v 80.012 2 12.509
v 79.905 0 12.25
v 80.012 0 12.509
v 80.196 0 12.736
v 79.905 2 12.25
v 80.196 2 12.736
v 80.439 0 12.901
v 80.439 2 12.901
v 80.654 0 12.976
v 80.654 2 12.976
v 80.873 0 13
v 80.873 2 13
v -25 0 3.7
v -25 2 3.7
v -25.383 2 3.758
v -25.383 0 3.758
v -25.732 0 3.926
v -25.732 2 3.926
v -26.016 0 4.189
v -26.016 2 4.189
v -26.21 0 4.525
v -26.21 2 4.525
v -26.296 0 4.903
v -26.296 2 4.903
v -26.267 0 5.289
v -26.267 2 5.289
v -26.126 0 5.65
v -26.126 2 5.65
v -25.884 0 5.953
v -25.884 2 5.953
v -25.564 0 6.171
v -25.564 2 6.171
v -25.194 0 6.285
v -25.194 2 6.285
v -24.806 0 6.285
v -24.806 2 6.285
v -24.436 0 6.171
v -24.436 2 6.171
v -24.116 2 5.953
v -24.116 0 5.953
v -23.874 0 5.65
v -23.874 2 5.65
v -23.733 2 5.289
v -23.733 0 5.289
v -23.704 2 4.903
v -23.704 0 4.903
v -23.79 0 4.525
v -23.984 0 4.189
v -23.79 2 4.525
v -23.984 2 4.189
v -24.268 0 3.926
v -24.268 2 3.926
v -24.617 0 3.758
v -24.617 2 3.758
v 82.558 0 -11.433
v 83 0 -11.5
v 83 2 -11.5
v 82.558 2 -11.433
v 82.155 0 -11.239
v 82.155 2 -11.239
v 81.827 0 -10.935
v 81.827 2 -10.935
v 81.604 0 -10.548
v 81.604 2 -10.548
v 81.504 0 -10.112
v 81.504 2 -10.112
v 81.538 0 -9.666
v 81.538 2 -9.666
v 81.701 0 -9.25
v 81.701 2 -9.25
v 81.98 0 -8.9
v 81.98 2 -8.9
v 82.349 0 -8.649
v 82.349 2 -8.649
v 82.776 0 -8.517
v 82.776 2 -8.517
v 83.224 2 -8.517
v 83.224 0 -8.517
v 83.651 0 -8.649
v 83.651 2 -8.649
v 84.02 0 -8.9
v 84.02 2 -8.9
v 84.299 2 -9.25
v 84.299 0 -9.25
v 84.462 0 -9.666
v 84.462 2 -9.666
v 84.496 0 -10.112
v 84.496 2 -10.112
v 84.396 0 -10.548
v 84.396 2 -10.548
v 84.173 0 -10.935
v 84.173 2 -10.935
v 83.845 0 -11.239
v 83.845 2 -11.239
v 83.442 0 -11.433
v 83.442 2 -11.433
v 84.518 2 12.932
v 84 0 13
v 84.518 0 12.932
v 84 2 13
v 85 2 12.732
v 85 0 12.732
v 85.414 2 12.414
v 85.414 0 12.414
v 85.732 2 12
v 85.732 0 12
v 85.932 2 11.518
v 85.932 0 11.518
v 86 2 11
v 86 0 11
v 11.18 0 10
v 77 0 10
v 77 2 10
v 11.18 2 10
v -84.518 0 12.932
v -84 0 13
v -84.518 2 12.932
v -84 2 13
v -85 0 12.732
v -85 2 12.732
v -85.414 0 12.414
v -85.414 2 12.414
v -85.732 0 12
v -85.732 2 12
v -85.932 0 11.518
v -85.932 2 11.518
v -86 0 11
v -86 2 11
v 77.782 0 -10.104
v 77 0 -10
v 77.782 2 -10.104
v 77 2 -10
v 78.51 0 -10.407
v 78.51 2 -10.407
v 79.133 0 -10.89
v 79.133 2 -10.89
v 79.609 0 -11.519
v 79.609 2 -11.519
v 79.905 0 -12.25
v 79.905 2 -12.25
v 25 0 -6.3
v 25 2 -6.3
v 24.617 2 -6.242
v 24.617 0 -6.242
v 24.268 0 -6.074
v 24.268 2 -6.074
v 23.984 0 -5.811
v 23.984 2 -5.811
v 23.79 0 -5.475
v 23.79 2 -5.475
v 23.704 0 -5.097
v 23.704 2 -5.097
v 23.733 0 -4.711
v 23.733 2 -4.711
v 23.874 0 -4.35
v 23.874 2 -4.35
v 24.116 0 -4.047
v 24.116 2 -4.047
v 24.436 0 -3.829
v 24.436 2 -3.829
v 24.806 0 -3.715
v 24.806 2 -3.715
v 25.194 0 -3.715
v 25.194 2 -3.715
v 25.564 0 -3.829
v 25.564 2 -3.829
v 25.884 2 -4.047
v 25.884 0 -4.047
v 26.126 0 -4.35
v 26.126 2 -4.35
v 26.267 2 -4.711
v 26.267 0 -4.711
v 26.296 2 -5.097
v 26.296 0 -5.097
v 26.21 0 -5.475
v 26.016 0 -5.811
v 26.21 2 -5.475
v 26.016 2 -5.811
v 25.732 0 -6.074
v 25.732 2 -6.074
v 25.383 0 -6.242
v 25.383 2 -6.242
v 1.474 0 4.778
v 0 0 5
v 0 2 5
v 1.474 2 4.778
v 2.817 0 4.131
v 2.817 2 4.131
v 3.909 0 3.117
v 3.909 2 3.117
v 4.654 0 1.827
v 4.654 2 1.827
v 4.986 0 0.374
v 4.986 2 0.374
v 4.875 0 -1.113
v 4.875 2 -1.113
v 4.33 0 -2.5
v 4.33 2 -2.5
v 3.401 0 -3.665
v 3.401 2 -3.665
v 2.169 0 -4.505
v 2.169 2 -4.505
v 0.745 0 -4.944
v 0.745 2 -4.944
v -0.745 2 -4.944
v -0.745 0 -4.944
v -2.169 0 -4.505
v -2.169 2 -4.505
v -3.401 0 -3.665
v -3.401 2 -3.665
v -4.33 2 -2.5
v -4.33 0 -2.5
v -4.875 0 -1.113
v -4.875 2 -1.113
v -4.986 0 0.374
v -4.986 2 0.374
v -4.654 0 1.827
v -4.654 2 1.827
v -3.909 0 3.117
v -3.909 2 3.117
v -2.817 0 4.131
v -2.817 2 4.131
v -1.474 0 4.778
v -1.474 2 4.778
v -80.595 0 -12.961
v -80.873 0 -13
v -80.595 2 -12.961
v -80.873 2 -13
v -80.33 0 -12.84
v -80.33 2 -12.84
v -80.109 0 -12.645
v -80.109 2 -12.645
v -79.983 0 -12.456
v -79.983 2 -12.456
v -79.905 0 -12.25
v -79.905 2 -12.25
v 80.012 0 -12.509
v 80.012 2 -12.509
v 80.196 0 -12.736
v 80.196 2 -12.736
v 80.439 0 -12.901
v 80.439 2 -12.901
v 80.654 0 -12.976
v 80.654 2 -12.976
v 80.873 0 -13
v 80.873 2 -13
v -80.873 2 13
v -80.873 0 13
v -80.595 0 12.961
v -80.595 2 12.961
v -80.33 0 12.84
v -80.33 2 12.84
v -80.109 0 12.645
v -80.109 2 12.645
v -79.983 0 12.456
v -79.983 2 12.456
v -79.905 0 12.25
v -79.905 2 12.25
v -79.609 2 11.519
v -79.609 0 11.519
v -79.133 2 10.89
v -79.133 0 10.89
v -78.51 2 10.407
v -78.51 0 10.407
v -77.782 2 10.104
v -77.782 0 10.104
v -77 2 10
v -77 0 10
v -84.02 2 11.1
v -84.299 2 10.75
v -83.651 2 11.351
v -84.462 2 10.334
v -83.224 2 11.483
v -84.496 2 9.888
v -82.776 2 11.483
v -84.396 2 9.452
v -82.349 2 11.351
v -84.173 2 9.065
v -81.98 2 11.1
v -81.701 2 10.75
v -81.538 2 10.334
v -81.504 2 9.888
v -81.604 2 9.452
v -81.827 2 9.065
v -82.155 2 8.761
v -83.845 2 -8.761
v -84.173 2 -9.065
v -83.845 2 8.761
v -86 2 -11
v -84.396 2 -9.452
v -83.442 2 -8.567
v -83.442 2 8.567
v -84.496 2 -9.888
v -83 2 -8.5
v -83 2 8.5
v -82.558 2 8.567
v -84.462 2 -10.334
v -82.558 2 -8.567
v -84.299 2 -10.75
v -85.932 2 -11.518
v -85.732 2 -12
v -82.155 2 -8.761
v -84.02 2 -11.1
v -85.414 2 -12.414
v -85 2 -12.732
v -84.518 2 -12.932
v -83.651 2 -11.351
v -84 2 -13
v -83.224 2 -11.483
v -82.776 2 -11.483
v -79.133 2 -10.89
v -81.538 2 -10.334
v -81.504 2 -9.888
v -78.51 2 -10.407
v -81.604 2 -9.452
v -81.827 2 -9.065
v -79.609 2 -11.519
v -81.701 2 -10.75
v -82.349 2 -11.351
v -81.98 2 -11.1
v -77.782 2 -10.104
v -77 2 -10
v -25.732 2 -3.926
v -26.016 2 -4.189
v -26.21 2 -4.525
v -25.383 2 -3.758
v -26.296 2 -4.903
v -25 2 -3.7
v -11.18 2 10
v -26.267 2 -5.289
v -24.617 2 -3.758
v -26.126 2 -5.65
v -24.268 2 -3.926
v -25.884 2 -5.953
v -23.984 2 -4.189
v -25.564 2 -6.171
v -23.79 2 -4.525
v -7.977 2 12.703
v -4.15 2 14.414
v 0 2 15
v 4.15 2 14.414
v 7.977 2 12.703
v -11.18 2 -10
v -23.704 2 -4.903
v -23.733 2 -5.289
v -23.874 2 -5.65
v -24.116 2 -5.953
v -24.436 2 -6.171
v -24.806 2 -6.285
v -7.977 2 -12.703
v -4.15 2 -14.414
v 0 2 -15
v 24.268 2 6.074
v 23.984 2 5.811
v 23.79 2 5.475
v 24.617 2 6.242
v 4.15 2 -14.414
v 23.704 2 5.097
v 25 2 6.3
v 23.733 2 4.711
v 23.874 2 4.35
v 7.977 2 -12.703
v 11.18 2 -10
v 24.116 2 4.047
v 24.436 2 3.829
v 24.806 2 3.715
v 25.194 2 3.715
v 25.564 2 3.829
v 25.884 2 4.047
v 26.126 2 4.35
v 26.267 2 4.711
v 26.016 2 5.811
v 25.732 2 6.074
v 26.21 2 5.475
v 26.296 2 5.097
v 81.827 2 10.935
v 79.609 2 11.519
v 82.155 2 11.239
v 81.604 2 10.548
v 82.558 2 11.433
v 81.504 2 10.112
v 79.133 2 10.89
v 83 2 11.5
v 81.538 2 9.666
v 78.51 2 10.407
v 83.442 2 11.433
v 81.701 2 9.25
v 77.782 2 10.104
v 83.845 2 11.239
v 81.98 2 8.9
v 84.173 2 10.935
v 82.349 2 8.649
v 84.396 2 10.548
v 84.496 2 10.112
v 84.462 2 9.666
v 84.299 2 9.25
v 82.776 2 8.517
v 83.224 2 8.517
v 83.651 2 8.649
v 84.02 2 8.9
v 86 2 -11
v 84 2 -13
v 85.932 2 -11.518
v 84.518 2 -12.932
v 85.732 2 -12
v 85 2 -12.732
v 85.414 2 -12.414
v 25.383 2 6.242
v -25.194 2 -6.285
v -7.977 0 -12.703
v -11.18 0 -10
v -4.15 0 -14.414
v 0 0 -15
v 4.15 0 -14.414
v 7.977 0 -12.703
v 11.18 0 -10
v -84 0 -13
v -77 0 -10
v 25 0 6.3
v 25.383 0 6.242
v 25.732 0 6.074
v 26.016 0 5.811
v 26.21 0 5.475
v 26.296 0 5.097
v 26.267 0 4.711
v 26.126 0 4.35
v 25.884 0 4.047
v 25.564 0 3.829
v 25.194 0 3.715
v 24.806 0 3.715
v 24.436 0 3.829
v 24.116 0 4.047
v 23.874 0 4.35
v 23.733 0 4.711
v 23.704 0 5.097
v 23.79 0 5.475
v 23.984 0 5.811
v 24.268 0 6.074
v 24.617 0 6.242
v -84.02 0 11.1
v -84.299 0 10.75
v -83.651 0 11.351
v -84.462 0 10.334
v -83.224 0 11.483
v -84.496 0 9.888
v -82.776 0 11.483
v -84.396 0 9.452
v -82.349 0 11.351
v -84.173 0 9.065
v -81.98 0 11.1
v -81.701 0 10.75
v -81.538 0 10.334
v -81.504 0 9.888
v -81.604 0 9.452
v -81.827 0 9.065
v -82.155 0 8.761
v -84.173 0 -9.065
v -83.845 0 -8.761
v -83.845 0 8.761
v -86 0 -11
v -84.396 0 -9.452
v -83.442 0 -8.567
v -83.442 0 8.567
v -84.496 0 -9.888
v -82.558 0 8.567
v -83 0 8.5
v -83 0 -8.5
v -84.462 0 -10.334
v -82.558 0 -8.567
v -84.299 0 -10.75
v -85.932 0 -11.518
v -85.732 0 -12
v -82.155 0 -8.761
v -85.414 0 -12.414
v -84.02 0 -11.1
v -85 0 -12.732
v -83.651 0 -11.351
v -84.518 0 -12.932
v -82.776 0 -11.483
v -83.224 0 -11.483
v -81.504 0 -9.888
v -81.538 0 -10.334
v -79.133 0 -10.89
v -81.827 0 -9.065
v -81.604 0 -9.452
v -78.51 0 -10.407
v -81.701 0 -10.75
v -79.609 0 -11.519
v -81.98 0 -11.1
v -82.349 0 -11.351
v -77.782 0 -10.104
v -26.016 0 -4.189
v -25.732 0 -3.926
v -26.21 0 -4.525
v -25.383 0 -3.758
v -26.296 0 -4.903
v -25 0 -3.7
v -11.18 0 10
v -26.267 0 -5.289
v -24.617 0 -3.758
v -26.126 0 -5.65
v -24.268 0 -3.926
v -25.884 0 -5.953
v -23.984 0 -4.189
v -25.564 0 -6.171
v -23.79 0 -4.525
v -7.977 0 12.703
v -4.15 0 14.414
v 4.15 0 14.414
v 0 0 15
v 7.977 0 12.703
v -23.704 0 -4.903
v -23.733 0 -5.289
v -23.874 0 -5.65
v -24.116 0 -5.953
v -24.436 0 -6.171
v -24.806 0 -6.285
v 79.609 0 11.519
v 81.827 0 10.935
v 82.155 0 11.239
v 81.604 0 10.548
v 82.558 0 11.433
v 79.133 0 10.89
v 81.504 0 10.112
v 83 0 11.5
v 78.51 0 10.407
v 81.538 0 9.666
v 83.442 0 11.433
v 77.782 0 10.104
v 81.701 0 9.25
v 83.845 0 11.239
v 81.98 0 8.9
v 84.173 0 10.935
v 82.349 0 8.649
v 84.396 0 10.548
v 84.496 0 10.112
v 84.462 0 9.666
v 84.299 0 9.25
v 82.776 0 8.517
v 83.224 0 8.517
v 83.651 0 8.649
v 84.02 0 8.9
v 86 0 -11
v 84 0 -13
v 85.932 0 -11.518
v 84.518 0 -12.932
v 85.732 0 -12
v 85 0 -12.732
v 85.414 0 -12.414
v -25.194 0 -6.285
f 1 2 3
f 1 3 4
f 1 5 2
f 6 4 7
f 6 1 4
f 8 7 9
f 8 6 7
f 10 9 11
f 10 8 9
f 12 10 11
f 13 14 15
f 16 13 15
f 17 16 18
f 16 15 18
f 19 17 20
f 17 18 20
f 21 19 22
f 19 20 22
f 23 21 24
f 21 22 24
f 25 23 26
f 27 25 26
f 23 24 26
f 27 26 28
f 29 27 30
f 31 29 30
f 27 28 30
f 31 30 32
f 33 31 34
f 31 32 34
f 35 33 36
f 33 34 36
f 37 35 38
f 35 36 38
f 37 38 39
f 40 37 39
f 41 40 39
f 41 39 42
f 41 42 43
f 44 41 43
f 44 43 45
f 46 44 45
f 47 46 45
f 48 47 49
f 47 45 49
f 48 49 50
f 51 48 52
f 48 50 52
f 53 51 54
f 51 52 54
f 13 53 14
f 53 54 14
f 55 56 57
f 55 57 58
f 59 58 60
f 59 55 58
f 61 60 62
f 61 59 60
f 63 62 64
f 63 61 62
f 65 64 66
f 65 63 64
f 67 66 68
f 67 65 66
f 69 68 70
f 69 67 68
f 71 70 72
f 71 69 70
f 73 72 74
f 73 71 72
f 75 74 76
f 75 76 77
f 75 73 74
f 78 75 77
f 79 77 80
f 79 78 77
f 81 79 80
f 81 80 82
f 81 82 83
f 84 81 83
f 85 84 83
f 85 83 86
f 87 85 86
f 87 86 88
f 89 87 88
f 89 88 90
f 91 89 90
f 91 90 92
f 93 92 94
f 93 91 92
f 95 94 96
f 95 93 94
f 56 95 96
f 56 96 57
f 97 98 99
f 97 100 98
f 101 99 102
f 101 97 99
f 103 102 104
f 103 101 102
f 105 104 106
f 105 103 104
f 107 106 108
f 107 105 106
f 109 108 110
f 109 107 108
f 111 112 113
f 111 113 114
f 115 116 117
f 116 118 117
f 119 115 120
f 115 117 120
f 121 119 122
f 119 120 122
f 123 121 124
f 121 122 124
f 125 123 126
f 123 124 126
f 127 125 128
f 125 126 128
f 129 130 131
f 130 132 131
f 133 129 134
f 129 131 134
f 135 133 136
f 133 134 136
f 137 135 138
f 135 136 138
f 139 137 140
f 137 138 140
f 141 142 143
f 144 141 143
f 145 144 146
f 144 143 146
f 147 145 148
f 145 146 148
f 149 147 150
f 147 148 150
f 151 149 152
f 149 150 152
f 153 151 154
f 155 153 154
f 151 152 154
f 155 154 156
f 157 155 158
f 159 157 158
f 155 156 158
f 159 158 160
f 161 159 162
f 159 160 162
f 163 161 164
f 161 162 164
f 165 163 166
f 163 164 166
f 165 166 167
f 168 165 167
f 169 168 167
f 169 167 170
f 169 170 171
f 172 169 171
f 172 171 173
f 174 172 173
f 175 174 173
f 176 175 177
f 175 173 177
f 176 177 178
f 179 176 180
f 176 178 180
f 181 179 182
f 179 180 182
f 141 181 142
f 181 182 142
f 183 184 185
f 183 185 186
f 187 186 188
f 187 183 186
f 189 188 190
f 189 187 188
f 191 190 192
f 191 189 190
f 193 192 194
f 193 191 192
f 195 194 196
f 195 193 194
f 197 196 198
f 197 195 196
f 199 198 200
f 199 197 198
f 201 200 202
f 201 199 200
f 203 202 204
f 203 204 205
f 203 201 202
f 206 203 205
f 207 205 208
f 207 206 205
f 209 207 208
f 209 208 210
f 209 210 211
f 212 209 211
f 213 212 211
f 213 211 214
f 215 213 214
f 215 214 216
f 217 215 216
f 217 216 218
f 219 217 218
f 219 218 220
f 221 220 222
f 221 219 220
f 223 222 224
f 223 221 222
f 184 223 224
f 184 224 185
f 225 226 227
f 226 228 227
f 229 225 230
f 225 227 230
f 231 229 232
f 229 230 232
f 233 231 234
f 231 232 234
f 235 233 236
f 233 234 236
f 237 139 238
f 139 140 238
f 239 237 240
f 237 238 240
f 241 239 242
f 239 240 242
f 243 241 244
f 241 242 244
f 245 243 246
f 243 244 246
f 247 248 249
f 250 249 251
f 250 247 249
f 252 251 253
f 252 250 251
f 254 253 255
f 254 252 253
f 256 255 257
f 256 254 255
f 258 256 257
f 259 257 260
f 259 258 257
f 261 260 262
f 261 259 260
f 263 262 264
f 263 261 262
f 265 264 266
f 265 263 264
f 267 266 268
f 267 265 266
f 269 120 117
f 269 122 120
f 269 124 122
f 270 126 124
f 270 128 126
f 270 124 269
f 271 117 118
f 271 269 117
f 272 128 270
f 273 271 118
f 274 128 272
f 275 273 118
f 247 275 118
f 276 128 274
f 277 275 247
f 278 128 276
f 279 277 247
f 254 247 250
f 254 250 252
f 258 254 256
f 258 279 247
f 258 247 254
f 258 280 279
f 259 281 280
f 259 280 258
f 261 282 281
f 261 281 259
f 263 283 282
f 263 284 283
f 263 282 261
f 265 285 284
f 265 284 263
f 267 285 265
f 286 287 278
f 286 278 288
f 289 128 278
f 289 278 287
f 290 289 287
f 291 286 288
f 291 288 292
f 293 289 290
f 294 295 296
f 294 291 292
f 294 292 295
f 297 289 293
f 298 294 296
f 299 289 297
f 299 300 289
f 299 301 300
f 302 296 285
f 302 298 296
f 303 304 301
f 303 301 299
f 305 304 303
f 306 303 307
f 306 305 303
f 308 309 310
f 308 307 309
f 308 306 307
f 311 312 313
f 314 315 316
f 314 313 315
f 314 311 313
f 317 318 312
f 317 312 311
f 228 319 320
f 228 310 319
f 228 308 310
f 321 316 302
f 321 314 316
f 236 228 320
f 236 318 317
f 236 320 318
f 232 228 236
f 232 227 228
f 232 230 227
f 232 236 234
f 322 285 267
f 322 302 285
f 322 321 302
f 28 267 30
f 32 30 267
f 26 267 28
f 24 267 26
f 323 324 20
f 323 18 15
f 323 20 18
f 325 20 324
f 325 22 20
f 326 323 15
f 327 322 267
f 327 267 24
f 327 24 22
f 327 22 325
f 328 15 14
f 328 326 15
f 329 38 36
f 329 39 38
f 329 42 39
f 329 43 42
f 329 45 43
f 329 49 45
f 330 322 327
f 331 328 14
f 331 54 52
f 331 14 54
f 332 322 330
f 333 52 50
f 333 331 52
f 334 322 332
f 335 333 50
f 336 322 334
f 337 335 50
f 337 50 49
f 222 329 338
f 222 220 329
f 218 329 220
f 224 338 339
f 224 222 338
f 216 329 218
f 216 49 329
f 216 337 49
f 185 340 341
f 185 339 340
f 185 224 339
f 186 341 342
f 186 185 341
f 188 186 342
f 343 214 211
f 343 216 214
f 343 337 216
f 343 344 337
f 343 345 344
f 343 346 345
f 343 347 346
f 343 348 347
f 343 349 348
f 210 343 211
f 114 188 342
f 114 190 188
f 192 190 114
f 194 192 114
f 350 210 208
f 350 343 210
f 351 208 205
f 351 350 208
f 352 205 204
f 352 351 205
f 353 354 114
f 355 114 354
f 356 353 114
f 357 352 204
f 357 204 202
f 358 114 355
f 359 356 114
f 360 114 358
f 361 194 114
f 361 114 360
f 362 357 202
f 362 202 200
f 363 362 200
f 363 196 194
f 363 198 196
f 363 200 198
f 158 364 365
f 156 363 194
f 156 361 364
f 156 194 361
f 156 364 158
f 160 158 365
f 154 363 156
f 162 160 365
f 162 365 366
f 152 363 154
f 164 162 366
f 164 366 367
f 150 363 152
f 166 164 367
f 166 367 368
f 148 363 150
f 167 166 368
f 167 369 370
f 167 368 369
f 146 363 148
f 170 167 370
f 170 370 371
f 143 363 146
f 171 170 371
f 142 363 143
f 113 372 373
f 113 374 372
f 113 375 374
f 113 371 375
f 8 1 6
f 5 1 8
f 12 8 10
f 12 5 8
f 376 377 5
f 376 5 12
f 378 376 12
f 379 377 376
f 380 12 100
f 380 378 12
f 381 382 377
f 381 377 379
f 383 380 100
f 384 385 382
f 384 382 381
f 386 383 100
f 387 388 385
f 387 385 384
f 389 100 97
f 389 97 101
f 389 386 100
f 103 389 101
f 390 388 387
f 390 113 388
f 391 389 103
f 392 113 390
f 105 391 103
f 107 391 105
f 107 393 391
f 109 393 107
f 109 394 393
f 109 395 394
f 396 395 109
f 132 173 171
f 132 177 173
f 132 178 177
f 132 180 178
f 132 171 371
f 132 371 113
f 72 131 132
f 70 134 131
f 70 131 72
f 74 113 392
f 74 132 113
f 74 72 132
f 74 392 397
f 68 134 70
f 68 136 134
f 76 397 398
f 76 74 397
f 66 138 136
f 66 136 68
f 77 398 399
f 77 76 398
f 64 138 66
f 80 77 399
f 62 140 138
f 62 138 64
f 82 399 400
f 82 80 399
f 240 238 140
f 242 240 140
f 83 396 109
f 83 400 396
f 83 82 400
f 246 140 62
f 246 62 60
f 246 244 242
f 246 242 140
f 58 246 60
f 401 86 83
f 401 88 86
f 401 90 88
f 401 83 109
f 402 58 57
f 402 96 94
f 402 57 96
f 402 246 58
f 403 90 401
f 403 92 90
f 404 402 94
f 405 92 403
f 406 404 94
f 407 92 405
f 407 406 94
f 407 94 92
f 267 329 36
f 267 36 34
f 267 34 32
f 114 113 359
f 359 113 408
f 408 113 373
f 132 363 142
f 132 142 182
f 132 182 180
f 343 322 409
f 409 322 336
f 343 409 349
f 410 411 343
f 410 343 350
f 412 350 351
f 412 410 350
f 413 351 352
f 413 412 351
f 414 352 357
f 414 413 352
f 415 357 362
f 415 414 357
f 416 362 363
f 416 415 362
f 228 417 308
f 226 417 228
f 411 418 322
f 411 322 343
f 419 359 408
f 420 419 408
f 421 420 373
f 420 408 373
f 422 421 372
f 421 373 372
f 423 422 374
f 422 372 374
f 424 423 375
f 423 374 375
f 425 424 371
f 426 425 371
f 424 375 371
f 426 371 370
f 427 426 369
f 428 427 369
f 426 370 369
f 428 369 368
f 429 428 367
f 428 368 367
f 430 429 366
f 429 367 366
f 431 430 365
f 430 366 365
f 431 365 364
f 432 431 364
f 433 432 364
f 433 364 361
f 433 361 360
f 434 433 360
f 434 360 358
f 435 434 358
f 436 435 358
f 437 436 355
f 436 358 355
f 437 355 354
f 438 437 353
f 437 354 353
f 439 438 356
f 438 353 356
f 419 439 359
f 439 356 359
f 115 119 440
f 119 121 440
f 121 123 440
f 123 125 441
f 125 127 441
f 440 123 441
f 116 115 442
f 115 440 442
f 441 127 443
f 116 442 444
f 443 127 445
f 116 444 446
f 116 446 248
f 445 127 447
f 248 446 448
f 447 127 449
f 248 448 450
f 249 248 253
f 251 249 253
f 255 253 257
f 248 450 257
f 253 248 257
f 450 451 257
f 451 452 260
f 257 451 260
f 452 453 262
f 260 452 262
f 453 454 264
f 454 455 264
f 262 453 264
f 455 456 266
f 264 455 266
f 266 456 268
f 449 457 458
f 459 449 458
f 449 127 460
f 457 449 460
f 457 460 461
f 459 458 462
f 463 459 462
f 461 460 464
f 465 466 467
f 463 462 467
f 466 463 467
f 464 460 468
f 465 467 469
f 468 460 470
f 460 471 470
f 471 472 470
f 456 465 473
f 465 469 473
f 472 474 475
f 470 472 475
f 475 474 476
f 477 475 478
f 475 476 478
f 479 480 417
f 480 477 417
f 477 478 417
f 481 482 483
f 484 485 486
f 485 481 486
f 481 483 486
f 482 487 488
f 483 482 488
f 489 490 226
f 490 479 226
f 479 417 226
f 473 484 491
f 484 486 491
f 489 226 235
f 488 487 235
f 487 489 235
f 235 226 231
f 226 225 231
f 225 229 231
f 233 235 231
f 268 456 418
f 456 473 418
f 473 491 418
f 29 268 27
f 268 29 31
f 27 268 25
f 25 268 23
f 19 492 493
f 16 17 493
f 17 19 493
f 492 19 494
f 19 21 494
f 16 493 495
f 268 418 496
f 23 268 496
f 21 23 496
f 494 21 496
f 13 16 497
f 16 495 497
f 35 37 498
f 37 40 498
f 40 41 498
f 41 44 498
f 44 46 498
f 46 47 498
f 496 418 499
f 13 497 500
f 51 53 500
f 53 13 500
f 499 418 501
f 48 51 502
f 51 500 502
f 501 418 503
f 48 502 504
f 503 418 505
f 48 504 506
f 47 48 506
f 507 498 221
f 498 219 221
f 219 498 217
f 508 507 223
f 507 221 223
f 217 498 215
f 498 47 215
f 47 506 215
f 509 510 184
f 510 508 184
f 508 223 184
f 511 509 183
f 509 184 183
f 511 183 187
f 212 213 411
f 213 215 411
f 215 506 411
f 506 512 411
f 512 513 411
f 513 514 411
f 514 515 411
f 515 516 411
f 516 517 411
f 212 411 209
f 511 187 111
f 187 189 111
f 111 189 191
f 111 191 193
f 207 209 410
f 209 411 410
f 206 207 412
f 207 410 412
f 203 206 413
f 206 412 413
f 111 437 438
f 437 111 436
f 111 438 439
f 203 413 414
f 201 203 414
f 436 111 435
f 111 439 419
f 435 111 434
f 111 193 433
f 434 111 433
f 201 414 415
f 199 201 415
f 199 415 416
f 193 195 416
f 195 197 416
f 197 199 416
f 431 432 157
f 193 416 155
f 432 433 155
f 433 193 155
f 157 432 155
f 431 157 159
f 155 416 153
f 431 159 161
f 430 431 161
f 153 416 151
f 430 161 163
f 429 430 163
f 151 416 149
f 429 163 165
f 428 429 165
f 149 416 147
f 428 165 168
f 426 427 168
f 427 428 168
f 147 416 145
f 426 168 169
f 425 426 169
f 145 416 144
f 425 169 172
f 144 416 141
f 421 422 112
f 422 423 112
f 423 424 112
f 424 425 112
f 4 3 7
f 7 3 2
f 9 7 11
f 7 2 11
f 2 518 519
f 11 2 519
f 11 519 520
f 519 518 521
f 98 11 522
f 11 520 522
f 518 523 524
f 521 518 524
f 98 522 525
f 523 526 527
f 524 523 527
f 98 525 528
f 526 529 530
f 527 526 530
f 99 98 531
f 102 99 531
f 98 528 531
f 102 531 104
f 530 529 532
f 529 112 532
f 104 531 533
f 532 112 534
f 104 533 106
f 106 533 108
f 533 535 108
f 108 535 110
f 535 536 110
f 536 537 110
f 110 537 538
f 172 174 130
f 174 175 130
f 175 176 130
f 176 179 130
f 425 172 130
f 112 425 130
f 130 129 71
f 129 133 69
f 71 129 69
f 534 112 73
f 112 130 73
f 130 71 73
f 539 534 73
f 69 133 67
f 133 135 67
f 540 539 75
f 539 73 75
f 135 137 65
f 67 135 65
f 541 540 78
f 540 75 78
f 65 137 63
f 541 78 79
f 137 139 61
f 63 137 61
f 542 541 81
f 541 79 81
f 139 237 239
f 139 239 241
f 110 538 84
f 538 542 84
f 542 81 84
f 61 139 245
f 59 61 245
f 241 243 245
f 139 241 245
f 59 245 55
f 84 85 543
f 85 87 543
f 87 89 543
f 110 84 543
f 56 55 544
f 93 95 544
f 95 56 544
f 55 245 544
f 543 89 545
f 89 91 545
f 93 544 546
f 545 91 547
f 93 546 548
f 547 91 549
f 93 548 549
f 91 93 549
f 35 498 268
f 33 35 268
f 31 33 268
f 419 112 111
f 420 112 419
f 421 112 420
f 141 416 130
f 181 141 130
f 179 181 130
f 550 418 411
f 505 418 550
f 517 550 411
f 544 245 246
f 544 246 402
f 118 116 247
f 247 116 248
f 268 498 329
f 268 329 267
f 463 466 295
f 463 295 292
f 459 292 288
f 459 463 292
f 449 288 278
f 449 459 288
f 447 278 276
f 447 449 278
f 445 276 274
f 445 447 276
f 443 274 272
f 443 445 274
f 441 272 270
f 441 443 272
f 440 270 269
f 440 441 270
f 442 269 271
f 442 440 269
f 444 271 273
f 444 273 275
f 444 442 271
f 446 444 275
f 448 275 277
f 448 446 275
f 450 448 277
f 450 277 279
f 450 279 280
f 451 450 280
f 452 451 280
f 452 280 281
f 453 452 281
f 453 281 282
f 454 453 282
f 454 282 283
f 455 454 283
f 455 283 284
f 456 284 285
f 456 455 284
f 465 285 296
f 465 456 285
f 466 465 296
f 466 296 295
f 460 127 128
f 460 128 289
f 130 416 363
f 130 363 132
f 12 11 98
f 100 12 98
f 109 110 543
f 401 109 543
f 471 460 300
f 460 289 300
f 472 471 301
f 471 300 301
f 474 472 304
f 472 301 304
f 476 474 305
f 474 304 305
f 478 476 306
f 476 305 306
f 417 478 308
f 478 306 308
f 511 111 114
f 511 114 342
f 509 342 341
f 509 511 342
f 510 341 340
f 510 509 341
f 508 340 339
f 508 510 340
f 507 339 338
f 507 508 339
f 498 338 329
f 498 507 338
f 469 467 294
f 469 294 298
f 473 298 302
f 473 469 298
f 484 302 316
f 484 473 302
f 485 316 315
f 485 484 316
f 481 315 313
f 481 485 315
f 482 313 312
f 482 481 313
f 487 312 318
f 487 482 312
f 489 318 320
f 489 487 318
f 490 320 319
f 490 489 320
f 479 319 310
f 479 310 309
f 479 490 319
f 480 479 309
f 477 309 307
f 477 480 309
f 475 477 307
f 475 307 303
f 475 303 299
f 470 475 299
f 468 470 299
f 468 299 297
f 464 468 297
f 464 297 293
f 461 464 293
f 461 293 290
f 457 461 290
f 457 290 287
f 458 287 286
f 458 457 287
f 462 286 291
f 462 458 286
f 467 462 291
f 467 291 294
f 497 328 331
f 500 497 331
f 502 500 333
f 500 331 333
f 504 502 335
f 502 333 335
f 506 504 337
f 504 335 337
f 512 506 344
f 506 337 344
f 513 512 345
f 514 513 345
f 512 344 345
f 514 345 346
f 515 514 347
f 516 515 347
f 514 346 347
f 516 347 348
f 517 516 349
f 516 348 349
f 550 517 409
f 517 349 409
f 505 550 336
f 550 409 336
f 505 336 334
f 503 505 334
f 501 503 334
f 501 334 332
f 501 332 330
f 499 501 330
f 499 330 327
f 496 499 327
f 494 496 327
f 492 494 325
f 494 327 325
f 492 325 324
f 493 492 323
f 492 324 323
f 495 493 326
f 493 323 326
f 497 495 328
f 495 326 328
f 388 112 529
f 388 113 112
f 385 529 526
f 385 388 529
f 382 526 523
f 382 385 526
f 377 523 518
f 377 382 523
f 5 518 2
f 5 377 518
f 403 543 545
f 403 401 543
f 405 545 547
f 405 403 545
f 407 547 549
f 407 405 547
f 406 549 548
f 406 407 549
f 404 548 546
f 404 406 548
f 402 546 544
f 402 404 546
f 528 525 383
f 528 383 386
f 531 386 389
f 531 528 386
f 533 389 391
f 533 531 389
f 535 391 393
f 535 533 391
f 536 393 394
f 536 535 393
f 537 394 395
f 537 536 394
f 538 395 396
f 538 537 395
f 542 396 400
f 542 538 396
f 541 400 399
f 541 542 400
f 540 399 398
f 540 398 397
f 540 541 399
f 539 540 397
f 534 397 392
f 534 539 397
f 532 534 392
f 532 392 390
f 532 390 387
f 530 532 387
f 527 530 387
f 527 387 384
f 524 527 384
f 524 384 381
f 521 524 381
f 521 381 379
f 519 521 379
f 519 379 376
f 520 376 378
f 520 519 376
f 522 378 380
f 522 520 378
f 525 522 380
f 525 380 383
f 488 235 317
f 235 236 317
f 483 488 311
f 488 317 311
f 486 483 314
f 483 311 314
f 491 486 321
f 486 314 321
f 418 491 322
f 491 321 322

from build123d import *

# Parameters (mm, degrees)
SKETCH_1_R          = 5
EXTRUDE_1_DEPTH     = 2
SKETCH_2_R          = 1.3
CUT_EXTRUDE_1_DEPTH = 2
SKETCH_3_W          = 6
SKETCH_3_H          = 26
SKETCH_3_R          = 1.5
EXTRUDE_2_DEPTH     = 2
FILLET_1_R          = 3
FILLET_2_R          = 2
FILLET_3_R          = 1


with BuildPart() as part:
    # 草图1 → 凸台-拉伸1 (new body)
    with BuildSketch(Plane(origin=(0, 0, 0), x_dir=(1, 0, 0), z_dir=(0, 1, 0))):
        with BuildLine():
            Line((11.180339887, 10), (80, 10))
            Line((80, 10), (80, -10))
            Line((80, -10), (11.180339887, -10))
            ThreePointArc((11.180339887, -10), (0, -15), (-11.180339887, -10))
            Line((-11.180339887, -10), (-80, -10))
            Line((-80, -10), (-80, 10))
            Line((-80, 10), (-11.180339887, 10))
            ThreePointArc((-11.180339887, 10), (0, 15), (11.180339887, 10))
        make_face()
        with Locations(Location((0, 0, 0), (0, 0, 270))):
            Circle(SKETCH_1_R, mode=Mode.SUBTRACT)
    extrude(amount=EXTRUDE_1_DEPTH)

    # 草图2 → 切除-拉伸1 (cut)
    with BuildSketch(Plane(origin=(0, 2, 0), x_dir=(1, 0, 0), z_dir=(0, 1, 0))):
        with Locations(Location((-25, 5, 0), (0, 0, 270))):
            Circle(SKETCH_2_R)
        with Locations(Location((-25, -5, 0), (0, 0, 90))):
            Circle(SKETCH_2_R)
        with Locations(Location((25, -5, 0), (0, 0, 270))):
            Circle(SKETCH_2_R)
        with Locations(Location((25, 5, 0), (0, 0, 90))):
            Circle(SKETCH_2_R)
    extrude(amount=-CUT_EXTRUDE_1_DEPTH, mode=Mode.SUBTRACT)

    # 草图3 → 凸台-拉伸2 (add)
    # profile 1 of 2: a face of its own
    with BuildSketch(Plane(origin=(0, 0, 0), x_dir=(1, 0, 0), z_dir=(0, 1, 0))):
        with Locations((-83, 0)):
            Rectangle(SKETCH_3_W, SKETCH_3_H)
        with Locations(Location((-83, 10, 0), (0, 0, 270))):
            Circle(SKETCH_3_R, mode=Mode.SUBTRACT)
        with Locations(Location((-83, -10, 0), (0, 0, 90))):
            Circle(SKETCH_3_R, mode=Mode.SUBTRACT)
    # profile 2 of 2: a face of its own
    with BuildSketch(Plane(origin=(0, 0, 0), x_dir=(1, 0, 0), z_dir=(0, 1, 0))):
        with Locations((83, 0)):
            Rectangle(SKETCH_3_W, SKETCH_3_H)
        with Locations(Location((83, -10, 0), (0, 0, 270))):
            Circle(SKETCH_3_R, mode=Mode.SUBTRACT)
        with Locations(Location((83, 10, 0), (0, 0, 90))):
            Circle(SKETCH_3_R, mode=Mode.SUBTRACT)
    extrude(amount=EXTRUDE_2_DEPTH)

    # 圆角1
    fillet_1_edges = [part.edges().sort_by_distance(p)[0] for p in [
        (80, 1, 10),
        (80, 1, -10),
        (-80, 1, -10),
        (-80, 1, 10),
    ]]
    fillet(fillet_1_edges, radius=FILLET_1_R - 0.0001)  # a hair under: the kernel refuses the full size

    # 圆角2
    fillet_2_edges = [part.edges().sort_by_distance(p)[0] for p in [
        (-86, 1, 13),
        (-86, 1, -13),
        (86, 1, 13),
        (86, 1, -13),
    ]]
    fillet(fillet_2_edges, radius=FILLET_2_R)

    # 圆角3
    fillet_3_edges = [part.edges().sort_by_distance(p)[0] for p in [
        (-80, 1, 13),
        (-80, 1, -13),
        (80, 1, -13),
        (80, 1, 13),
    ]]
    fillet(fillet_3_edges, radius=FILLET_3_R)


solid = part.part
